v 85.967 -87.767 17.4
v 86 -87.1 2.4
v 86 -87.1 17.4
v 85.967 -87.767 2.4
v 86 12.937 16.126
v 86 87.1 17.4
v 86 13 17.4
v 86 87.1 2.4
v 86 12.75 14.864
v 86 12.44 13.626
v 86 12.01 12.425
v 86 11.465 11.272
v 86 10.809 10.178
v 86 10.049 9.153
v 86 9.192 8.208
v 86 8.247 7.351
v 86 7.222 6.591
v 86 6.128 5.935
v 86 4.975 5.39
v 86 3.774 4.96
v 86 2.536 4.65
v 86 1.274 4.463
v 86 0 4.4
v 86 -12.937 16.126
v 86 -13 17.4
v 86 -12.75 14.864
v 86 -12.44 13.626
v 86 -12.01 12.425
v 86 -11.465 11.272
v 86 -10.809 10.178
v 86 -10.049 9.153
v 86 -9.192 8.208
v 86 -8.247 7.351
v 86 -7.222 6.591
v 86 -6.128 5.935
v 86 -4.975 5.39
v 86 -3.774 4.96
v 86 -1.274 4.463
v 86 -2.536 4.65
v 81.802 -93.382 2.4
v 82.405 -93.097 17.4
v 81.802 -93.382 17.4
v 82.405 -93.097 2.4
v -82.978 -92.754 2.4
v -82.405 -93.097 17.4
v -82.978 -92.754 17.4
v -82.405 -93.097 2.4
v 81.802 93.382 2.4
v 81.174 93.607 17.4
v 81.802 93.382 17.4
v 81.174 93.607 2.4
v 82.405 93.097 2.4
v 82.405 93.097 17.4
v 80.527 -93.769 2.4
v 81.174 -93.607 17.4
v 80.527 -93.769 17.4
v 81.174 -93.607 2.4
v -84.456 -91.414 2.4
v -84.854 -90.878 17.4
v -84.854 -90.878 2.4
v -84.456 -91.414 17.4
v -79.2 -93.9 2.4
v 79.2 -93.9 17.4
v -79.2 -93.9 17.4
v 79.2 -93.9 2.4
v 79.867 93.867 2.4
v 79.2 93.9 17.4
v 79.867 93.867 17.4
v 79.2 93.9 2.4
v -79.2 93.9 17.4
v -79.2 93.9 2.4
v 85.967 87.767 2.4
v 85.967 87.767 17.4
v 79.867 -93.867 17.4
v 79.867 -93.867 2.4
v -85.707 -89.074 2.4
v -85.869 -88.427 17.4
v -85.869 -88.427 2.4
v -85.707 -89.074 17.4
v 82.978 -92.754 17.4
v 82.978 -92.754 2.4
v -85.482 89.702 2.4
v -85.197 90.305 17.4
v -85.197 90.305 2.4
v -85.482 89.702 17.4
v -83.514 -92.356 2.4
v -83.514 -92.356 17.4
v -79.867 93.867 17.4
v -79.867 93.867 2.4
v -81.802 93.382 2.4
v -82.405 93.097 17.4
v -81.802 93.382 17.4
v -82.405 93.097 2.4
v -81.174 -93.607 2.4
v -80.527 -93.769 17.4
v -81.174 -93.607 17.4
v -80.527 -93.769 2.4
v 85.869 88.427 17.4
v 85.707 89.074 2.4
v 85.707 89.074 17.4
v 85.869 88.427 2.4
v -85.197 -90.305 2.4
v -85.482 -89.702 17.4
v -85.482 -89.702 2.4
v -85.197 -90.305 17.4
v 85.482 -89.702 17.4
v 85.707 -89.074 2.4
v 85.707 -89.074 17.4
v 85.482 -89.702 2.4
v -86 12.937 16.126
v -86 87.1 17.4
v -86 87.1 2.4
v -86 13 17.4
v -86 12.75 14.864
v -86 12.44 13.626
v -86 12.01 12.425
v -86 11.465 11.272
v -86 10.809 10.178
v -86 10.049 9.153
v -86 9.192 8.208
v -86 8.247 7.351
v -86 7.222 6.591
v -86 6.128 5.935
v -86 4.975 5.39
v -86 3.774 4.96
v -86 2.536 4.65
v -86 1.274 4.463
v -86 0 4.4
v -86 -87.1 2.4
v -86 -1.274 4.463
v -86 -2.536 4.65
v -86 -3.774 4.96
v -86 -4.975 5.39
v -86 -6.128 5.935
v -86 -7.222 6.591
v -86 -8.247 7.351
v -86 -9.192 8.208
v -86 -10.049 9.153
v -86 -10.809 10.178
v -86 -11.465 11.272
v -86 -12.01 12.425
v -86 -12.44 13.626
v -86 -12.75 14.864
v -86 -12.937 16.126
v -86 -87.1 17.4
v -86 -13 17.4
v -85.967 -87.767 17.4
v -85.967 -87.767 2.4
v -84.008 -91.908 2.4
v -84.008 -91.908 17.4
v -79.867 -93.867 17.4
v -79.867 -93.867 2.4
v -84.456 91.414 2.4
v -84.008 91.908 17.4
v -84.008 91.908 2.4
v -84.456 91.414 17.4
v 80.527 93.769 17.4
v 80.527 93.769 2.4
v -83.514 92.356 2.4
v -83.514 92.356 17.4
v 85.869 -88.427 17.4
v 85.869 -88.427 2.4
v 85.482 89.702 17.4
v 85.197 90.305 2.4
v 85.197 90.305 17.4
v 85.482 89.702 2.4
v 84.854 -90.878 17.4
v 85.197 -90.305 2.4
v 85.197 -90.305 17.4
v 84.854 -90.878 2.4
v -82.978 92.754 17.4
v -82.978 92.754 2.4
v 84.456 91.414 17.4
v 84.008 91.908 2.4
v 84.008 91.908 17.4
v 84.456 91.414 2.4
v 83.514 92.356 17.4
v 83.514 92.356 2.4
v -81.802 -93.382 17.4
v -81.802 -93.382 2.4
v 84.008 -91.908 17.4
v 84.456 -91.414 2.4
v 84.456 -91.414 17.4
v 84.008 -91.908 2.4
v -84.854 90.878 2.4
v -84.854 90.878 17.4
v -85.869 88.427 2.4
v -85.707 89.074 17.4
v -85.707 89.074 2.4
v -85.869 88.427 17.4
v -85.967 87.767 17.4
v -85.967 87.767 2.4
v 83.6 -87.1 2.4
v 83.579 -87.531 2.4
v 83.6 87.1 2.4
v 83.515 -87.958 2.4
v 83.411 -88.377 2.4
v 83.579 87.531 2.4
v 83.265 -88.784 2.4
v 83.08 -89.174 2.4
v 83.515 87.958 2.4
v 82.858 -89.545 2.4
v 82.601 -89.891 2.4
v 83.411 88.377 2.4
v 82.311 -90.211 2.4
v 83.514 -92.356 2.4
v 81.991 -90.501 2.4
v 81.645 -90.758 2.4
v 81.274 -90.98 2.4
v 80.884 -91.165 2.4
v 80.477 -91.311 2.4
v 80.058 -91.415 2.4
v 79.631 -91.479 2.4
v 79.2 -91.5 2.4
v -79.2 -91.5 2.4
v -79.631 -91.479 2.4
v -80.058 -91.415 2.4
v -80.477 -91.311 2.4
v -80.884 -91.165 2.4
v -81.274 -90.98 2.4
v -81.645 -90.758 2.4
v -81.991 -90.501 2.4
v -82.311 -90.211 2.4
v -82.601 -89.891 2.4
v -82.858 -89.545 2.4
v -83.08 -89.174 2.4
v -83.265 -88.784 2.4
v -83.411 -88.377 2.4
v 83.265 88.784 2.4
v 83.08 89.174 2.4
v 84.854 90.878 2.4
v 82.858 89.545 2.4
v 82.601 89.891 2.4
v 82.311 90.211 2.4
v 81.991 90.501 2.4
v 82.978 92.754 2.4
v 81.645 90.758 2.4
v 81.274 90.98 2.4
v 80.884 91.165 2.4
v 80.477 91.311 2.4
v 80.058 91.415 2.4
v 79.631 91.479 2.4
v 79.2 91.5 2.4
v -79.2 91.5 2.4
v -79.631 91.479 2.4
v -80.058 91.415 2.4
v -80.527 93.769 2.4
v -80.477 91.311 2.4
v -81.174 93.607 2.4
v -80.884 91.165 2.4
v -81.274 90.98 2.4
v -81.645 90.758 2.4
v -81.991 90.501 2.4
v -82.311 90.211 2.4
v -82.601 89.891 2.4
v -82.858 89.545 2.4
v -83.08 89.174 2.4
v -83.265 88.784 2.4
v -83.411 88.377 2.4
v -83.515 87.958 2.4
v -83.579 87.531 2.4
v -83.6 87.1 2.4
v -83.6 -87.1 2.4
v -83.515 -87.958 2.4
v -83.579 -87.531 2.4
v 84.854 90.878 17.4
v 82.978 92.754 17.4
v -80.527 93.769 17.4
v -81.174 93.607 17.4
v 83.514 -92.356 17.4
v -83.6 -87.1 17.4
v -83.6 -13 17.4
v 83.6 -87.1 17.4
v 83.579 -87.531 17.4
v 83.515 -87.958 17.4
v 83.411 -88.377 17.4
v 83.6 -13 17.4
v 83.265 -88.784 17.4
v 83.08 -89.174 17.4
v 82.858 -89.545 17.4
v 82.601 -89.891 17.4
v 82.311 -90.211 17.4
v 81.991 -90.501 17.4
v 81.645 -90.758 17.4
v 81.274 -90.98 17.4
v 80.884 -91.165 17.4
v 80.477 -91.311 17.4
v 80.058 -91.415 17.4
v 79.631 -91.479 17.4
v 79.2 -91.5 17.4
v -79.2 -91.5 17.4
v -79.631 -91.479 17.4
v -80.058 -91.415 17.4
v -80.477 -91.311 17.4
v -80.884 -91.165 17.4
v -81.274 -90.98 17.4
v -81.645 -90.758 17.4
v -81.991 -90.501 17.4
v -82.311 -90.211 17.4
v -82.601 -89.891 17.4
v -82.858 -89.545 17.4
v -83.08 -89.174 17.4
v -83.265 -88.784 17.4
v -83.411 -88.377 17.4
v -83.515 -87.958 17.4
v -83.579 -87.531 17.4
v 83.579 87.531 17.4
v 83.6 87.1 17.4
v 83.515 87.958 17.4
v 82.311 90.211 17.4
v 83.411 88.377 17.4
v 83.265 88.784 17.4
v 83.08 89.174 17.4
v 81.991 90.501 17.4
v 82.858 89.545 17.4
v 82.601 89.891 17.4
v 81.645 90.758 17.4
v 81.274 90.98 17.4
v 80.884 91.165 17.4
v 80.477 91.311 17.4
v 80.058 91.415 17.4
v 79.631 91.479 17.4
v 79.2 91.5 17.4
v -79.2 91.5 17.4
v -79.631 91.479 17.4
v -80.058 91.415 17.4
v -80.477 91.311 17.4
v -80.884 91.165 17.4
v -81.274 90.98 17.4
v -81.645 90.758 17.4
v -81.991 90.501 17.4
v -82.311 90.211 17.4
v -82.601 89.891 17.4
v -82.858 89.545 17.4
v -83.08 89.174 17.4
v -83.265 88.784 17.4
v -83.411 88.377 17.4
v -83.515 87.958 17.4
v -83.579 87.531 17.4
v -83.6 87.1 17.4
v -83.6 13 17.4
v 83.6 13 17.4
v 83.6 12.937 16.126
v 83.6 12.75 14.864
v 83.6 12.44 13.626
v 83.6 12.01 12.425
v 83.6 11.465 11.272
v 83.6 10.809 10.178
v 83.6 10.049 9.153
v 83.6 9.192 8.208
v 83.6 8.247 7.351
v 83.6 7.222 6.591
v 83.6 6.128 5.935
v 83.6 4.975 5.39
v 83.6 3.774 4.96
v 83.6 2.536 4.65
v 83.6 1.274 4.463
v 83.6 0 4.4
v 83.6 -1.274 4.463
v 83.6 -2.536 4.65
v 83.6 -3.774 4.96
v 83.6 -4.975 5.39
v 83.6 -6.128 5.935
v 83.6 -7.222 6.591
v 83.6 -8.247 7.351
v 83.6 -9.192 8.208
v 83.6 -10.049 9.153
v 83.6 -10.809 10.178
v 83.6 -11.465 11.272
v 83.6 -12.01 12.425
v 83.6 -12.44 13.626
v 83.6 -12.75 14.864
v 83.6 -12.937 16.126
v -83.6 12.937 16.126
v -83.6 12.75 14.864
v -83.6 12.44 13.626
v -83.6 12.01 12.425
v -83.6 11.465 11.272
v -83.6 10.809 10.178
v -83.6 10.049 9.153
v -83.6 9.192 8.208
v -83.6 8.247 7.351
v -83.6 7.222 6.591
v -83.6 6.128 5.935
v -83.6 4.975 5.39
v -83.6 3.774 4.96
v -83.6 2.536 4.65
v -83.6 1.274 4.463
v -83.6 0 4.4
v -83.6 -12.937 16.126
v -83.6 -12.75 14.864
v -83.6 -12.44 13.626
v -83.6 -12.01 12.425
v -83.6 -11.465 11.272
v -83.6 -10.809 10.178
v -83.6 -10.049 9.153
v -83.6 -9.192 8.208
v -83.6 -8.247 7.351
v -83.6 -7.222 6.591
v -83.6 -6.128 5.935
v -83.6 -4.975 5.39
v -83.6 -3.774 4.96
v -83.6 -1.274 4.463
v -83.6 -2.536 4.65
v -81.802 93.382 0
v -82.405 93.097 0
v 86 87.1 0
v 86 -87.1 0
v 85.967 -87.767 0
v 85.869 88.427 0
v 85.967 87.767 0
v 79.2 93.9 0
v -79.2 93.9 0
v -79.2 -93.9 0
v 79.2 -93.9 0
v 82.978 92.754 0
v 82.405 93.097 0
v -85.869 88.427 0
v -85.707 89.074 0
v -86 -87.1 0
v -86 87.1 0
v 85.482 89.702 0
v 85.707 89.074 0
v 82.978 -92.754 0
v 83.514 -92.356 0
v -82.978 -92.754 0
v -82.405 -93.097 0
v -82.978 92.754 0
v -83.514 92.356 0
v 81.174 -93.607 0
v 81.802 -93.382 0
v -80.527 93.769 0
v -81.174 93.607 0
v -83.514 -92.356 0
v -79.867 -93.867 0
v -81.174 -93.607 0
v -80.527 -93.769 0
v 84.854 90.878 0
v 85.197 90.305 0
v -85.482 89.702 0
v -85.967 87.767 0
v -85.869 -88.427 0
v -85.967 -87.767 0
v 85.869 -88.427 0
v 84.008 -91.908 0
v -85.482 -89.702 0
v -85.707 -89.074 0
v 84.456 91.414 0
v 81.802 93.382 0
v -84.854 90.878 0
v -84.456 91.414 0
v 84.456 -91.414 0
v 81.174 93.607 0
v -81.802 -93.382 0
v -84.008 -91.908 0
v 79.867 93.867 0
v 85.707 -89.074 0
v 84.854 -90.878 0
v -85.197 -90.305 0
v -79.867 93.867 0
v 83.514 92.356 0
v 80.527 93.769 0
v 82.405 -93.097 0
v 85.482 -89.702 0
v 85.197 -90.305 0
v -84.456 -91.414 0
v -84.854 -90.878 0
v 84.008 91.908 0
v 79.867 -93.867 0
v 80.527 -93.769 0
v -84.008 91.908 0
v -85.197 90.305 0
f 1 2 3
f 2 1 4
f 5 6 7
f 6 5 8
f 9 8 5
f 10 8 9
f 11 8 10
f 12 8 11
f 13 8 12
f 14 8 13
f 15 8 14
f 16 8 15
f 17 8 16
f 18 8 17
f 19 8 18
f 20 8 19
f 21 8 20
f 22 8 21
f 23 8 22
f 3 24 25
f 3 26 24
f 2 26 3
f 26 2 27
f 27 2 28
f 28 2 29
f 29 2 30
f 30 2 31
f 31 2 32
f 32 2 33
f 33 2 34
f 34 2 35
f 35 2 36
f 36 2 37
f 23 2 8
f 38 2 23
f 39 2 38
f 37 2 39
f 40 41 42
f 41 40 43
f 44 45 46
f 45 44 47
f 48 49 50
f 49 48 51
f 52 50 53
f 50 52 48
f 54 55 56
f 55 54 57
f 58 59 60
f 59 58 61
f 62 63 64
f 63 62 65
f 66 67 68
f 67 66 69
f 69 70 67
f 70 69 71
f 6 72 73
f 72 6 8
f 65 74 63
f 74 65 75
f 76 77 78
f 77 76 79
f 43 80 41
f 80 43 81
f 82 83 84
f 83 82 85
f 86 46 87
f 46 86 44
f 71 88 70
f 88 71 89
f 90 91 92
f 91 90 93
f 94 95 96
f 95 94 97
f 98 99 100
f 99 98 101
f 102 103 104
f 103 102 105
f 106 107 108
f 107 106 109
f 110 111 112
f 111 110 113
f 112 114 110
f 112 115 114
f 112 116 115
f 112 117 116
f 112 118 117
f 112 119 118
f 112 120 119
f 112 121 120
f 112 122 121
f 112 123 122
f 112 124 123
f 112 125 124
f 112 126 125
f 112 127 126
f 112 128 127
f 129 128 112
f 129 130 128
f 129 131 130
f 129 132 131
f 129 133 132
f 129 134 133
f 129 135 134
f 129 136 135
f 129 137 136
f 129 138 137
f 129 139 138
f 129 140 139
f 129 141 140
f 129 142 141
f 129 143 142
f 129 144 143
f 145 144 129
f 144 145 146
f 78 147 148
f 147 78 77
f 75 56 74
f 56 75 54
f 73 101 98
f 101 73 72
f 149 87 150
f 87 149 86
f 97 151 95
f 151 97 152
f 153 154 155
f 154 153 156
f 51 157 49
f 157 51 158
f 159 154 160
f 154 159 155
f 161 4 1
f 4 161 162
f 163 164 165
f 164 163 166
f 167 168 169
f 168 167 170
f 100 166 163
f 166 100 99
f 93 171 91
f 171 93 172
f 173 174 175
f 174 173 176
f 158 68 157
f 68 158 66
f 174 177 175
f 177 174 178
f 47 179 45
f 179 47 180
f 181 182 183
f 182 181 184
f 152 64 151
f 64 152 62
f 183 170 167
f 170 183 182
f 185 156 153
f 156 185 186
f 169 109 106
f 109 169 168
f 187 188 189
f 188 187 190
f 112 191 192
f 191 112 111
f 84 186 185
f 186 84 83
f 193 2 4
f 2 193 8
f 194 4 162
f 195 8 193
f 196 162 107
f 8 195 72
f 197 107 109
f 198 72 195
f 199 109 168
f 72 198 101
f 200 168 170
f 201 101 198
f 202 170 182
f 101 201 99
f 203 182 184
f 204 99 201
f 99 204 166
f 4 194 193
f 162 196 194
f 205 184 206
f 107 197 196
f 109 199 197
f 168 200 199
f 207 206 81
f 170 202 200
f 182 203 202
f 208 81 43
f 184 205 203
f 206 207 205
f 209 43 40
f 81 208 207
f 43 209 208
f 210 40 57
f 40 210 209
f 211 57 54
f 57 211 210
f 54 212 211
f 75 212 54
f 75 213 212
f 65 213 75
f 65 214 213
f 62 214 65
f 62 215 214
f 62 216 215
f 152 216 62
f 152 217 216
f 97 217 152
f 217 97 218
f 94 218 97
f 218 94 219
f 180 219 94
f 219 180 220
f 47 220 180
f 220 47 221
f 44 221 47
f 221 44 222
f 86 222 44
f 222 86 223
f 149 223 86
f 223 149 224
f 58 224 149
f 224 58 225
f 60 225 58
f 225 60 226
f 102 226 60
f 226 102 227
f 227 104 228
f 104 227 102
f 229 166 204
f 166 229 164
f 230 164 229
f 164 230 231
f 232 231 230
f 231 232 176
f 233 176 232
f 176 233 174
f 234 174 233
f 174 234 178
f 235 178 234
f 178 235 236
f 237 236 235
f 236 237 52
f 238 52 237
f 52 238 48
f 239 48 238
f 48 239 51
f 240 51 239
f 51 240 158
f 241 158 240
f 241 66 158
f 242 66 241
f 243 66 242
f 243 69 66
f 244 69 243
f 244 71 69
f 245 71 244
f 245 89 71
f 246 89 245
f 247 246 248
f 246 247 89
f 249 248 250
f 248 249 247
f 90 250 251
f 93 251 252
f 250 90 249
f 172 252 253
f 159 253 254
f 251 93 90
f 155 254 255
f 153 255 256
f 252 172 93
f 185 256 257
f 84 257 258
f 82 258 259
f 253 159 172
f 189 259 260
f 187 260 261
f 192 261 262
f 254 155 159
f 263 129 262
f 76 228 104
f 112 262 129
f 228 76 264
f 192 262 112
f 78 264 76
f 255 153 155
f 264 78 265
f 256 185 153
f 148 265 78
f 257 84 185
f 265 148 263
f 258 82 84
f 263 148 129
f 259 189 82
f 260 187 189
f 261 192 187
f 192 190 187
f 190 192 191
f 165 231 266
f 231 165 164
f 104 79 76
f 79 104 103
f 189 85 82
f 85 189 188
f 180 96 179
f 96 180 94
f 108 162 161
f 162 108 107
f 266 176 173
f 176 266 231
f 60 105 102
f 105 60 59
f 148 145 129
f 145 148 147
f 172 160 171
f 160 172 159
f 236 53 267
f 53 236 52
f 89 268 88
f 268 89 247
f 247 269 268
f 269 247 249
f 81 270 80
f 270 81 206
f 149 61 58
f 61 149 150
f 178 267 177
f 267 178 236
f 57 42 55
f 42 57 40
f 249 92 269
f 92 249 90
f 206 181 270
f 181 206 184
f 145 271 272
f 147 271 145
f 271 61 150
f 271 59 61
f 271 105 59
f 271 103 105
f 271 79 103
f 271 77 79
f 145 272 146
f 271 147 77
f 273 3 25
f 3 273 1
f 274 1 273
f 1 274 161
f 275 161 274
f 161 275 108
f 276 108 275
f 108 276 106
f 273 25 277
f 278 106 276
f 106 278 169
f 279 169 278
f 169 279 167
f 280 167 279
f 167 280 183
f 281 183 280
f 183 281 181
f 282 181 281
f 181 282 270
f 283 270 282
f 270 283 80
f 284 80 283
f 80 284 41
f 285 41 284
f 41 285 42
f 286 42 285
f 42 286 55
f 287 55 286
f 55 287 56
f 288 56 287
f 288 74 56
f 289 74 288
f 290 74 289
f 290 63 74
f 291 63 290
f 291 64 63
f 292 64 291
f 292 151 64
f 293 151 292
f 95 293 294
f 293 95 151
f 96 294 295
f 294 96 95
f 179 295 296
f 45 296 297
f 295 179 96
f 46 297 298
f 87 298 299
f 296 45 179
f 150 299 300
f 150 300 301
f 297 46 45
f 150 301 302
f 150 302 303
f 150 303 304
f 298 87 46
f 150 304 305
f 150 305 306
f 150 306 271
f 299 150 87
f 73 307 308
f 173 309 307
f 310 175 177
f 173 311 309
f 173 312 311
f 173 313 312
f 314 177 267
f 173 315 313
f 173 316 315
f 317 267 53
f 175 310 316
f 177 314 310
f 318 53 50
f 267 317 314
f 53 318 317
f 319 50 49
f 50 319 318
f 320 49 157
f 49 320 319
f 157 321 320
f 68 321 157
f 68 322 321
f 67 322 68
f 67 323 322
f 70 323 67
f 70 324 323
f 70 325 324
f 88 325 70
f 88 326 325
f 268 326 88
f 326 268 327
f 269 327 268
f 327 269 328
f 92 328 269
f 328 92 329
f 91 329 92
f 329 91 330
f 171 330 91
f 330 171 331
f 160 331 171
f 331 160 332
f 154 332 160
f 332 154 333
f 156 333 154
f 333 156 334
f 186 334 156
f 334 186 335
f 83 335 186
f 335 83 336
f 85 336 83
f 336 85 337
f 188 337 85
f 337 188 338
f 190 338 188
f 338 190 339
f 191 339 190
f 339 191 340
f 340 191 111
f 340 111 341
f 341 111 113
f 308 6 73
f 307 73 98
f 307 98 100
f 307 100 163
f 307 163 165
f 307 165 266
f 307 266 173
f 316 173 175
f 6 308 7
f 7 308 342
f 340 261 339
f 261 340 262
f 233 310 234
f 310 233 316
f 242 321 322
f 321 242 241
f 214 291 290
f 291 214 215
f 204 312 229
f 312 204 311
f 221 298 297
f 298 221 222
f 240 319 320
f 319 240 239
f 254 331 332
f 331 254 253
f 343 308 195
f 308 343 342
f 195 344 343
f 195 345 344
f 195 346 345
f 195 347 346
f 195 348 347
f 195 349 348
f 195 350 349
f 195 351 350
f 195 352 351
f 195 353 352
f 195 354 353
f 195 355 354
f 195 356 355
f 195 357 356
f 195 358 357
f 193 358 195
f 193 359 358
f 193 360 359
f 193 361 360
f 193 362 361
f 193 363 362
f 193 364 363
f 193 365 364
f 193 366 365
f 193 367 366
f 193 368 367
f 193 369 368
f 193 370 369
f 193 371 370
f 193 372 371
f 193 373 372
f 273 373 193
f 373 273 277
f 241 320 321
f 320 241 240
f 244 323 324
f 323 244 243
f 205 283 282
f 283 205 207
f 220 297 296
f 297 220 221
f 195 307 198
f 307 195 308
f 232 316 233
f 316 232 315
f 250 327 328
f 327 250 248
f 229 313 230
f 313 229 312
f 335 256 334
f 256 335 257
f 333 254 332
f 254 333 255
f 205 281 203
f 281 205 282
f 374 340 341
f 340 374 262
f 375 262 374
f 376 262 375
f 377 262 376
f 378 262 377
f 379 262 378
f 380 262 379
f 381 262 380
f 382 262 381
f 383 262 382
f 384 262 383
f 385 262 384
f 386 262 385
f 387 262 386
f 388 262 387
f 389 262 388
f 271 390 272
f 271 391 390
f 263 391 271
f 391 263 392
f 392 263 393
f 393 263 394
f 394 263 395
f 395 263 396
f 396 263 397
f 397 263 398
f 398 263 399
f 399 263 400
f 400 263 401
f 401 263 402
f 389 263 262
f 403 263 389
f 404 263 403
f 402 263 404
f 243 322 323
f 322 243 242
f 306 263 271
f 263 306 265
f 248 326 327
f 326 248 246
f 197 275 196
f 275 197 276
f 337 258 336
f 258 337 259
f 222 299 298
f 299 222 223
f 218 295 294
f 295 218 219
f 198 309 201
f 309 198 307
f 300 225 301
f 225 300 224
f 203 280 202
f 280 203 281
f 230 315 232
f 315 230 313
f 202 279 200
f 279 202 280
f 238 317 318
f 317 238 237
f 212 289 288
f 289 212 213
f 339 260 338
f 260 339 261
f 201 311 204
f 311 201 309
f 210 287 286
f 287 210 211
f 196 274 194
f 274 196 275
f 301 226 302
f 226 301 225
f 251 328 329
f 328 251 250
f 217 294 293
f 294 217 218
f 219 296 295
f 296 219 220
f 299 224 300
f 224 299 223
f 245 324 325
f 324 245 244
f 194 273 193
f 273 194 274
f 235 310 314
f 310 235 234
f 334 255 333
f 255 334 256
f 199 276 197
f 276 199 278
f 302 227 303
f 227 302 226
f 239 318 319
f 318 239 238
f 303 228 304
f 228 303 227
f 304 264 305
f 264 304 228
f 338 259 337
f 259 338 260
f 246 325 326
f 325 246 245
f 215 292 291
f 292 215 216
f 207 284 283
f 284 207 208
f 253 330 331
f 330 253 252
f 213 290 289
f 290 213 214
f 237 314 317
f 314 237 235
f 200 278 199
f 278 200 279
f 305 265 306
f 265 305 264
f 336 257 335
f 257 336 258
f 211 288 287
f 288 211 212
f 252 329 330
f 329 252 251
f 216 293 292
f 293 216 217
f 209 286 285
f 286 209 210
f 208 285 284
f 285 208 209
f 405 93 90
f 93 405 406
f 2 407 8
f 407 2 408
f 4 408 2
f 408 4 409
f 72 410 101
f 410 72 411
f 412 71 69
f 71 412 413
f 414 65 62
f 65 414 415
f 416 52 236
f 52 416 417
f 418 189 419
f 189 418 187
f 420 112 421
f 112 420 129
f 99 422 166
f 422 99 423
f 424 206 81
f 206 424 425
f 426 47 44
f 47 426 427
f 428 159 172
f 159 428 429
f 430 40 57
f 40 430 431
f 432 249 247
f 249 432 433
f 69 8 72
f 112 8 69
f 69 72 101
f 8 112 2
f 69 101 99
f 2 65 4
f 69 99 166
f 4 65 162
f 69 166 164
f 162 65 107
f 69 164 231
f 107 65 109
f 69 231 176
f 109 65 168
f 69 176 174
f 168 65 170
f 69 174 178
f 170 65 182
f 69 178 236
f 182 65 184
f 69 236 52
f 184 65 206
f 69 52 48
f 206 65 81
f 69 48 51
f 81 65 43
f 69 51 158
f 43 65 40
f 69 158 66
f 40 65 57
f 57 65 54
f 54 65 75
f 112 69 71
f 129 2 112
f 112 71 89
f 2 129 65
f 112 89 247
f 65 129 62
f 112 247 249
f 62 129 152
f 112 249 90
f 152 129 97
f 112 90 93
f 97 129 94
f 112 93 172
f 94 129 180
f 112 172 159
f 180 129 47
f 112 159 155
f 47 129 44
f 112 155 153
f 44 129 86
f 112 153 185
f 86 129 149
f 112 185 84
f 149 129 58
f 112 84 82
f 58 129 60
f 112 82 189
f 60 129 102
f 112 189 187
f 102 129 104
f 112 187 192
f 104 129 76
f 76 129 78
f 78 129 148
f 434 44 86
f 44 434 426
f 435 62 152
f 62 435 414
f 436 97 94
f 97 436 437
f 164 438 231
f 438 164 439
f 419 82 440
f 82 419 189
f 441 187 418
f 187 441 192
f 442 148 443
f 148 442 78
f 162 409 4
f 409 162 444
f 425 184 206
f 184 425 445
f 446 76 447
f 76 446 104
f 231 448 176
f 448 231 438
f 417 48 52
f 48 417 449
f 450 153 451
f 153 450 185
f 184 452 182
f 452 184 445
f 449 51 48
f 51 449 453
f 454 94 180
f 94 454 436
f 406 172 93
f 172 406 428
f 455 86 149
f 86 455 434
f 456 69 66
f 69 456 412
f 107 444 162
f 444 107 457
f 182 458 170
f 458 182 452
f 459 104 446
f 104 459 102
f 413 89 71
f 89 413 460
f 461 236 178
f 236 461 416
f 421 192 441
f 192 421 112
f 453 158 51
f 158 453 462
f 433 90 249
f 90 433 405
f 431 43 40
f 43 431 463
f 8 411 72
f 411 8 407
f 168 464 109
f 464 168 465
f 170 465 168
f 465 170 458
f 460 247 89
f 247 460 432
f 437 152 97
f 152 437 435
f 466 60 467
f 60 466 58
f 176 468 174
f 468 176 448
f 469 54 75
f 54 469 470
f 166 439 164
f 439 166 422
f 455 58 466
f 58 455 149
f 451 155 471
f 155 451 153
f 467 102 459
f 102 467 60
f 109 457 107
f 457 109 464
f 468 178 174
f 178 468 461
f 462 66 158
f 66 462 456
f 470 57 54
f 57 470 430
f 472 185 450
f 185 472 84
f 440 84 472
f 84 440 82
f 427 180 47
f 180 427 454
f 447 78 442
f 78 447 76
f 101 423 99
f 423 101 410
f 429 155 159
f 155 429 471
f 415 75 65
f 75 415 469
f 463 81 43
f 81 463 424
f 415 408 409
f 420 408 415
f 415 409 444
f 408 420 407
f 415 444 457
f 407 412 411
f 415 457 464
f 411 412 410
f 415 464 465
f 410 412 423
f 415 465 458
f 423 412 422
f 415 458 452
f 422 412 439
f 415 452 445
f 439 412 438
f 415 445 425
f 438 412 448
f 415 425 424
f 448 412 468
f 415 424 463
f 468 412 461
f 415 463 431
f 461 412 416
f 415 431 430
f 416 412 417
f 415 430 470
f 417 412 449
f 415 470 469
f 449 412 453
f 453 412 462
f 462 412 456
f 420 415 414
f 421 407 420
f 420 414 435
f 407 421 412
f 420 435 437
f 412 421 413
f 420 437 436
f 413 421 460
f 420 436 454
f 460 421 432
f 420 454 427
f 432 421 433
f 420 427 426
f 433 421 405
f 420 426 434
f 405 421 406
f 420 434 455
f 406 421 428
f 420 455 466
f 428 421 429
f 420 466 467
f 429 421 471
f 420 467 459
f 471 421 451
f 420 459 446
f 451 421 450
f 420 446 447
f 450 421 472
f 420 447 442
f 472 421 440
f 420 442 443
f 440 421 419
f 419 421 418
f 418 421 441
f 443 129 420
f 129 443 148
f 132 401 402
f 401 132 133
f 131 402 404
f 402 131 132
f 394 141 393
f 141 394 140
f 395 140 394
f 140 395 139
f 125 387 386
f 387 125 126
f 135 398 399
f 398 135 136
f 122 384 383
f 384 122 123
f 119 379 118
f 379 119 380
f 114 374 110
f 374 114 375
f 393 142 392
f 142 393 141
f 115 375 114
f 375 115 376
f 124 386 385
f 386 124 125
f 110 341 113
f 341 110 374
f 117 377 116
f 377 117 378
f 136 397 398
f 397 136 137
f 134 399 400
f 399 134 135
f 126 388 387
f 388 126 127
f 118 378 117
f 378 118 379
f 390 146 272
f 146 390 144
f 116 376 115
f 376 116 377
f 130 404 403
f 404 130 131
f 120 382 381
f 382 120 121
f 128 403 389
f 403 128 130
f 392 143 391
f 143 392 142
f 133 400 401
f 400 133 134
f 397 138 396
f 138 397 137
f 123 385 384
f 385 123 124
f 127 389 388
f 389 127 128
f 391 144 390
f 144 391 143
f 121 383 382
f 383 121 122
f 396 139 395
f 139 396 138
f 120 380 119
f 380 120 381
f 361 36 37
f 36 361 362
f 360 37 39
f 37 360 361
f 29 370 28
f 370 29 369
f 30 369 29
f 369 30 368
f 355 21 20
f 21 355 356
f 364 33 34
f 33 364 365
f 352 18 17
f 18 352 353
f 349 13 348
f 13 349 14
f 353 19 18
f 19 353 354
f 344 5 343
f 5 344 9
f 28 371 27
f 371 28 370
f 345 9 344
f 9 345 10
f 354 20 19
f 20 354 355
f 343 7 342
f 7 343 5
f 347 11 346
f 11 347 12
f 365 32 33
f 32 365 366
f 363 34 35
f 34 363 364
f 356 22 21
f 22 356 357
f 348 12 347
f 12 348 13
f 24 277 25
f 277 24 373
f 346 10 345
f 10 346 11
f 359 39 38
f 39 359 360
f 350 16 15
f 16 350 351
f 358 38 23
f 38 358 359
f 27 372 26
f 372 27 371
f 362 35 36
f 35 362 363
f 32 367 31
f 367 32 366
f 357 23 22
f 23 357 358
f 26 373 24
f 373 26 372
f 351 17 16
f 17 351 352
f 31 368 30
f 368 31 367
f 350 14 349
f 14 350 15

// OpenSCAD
// file: ../scad/vial_vault.scad
// vial_vault.scad -- parametric dark-storage vial holder (tray + lift-off lid)
// Geometry variables + POCKETS list are supplied by build/<D>_geom.scad.
// PART is set by the wrapper (build/<D>_tray.scad / _lid.scad). NEVER re-assign PART here.
$fn = 64;

part_sel = is_undef(PART) ? "tray" : PART;   // read-only selector (see memory gotcha)

// ---- rounded rectangular prism, centred in XY, z=0..h ----
module rrect(sx, sy, h, r) {
    r = min(r, sx/2, sy/2);
    hull() for (dx = [r - sx/2, sx/2 - r], dy = [r - sy/2, sy/2 - r])
        translate([dx, dy, 0]) cylinder(r = r, h = h);
}

// ---- one pocket tube: solid cylinder w/ bored vial cavity from top ----
module pocket(p) {
    x = p[0]; y = p[1]; bore = p[2]; depth = p[3]; small = p[4];
    scal = len(p) > 5 ? p[5] : 0;
    tube_od = bore + 2 * PWALL;
    translate([x, y, BASE_T]) {
        difference() {
            cylinder(d = tube_od, h = TUBE_H);
            // vial cavity: bored from the tube top down by `depth`
            translate([0, 0, TUBE_H - depth])
                cylinder(d = bore, h = depth + 0.1);
            // lead-in chamfer at the bore mouth: funnels the vial in on the drop
            translate([0, 0, TUBE_H - 1.6])
                cylinder(d1 = bore, d2 = bore + 2.4, h = 1.7);
            // finger scallop on small pockets: side notch from rim down ~18mm,
            // pointed toward the box centre (never faces the perimeter wall)
            if (FINGER_SCALLOP && small == 1)
                rotate([0, 0, scal])
                    translate([tube_od/2 - 1.5, 0, TUBE_H - 18])
                        cylinder(d = bore * 0.55, h = 20);
        }
    }
}

module all_pockets() {
    for (p = POCKETS) pocket(p);
}

// ---- hand slots cut through the two short (X-facing) end walls ----
module hand_slots() {
    sw = 60; sh = 16; zc = RIM_H - 14;
    for (sx = [-1, 1])
        translate([sx * (OUTER_W/2), 0, zc]) rotate([90, 0, 90])
            linear_extrude(height = WALL * 4, center = true)
                offset(r = sh/2) square([sw - sh, 0.01], center = true);
}

module tray() {
    difference() {
        union() {
            // base slab (with a bottom outer chamfer for clean first-layer adhesion)
            hull() {
                translate([0, 0, 0.8])
                    rrect(OUTER_W, OUTER_L, BASE_T - 0.8, CORNER_R);
                rrect(OUTER_W - 1.6, OUTER_L - 1.6, 0.6, CORNER_R);
            }
            // perimeter wall (hollow frame)
            difference() {
                rrect(OUTER_W, OUTER_L, RIM_H, CORNER_R);
                translate([0, 0, BASE_T])
                    rrect(OUTER_W - 2*WALL, OUTER_L - 2*WALL, RIM_H, max(0.5, CORNER_R - WALL));
            }
            // pocket tubes
            all_pockets();
        }
        if (HAND_SLOTS) hand_slots();
    }
}

module lid() {
    lw = OUTER_W + 2 * (LID_GAP + SKIRT_W);
    ll = OUTER_L + 2 * (LID_GAP + SKIRT_W);
    lr = CORNER_R + LID_GAP + SKIRT_W;
    // printed roof-down: roof plate at z=0, skirt rising in +z
    difference() {
        union() {
            rrect(lw, ll, ROOF_T, lr);                      // roof
            translate([0, 0, ROOF_T])
                difference() {                              // skirt wall
                    rrect(lw, ll, SKIRT_H, lr);
                    translate([0, 0, -0.1])
                        rrect(OUTER_W + 2*LID_GAP, OUTER_L + 2*LID_GAP, SKIRT_H + 0.2,
                              CORNER_R + LID_GAP);
                }
        }
        // finger-pull scallops on both short (X) ends of the skirt for easy lift-off
        for (sx = [-1, 1])
            translate([sx * lw/2, 0, ROOF_T + SKIRT_H])
                scale([1, 1, 1]) rotate([90, 0, 90])
                    cylinder(d = 26, h = SKIRT_W * 4, center = true);
    }
}

// ---- fit-audit cutaway: tray sliced at y=0 with reference vials at rest height ----
module ghost_vials() {
    for (p = POCKETS) {
        x = p[0]; y = p[1]; bore = p[2]; depth = p[3];
        vial_od = bore - 3;                 // nominal vial OD (bore minus clearance)
        vial_h  = depth - 2;                // nominal vial height (depth minus bore-gap)
        rest_z  = BASE_T + (TUBE_H - depth); // pedestal top the vial sits on
        translate([x, y, rest_z]) cylinder(d = max(2, vial_od), h = vial_h);
    }
}

module section() {
    difference() {
        union() {
            tray();
            // reference vials shown translucent-ish (own color) to check seating
            color([0.85, 0.2, 0.2]) ghost_vials();
        }
        // cut away the +Y half to expose the interior
        translate([-(OUTER_W + 40)/2, 0, -1])
            cube([OUTER_W + 40, OUTER_L + 40, RIM_H + 40]);
    }
}

if (part_sel == "tray") tray();
else if (part_sel == "lid") lid();
else if (part_sel == "section") section();
else { tray(); }
// file: B_geom.scad
// AUTO-GENERATED by layout.py for design B. Do not edit by hand.
DESIGN = "B";
OUTER_W = 166.4;
OUTER_L = 182.2;
RIM_H = 95.0;
TUBE_H = 84.0;
BASE_T = 3.0;
WALL = 3.0;
PWALL = 2.0;
CORNER_R = 4.0;
LID_GAP = 0.4;
SKIRT_W = 2.4;
SKIRT_H = 15.0;
ROOF_T = 2.4;
HAND_SLOTS = true;
FINGER_SCALLOP = true;
POCKETS = [
  [-20.3, -64.1, 36.0, 80.0, 0, 72.4],
  [20.3, -64.1, 36.0, 80.0, 0, 107.6],
  [-61.2, -24.1, 26.0, 57.0, 0, 21.5],
  [-30.6, -24.1, 26.0, 57.0, 0, 38.2],
  [0.0, -24.1, 26.0, 57.0, 0, 90.0],
  [30.6, -24.1, 26.0, 57.0, 0, 141.8],
  [61.2, -24.1, 26.0, 57.0, 0, 158.5],
  [-9.3, 4.9, 14.0, 67.0, 1, -27.8],
  [9.3, 4.9, 14.0, 67.0, 1, -152.2],
  [-9.3, 23.5, 14.0, 67.0, 1, -68.4],
  [9.3, 23.5, 14.0, 67.0, 1, -111.6],
  [-47.2, 49.0, 19.0, 47.0, 1, -46.1],
  [-23.6, 49.0, 19.0, 47.0, 1, -64.3],
  [0.0, 49.0, 19.0, 47.0, 1, -90.0],
  [23.6, 49.0, 19.0, 47.0, 1, -115.7],
  [47.2, 49.0, 19.0, 47.0, 1, -133.9],
  [-47.2, 72.6, 19.0, 47.0, 1, -57.0],
  [-23.6, 72.6, 19.0, 47.0, 1, -72.0],
  [0.0, 72.6, 19.0, 47.0, 1, -90.0],
  [23.6, 72.6, 19.0, 47.0, 1, -108.0],
  [47.2, 72.6, 19.0, 47.0, 1, -123.0],
];
// main file
PART = "lid";
include <B_geom.scad>
include <../scad/vial_vault.scad>
